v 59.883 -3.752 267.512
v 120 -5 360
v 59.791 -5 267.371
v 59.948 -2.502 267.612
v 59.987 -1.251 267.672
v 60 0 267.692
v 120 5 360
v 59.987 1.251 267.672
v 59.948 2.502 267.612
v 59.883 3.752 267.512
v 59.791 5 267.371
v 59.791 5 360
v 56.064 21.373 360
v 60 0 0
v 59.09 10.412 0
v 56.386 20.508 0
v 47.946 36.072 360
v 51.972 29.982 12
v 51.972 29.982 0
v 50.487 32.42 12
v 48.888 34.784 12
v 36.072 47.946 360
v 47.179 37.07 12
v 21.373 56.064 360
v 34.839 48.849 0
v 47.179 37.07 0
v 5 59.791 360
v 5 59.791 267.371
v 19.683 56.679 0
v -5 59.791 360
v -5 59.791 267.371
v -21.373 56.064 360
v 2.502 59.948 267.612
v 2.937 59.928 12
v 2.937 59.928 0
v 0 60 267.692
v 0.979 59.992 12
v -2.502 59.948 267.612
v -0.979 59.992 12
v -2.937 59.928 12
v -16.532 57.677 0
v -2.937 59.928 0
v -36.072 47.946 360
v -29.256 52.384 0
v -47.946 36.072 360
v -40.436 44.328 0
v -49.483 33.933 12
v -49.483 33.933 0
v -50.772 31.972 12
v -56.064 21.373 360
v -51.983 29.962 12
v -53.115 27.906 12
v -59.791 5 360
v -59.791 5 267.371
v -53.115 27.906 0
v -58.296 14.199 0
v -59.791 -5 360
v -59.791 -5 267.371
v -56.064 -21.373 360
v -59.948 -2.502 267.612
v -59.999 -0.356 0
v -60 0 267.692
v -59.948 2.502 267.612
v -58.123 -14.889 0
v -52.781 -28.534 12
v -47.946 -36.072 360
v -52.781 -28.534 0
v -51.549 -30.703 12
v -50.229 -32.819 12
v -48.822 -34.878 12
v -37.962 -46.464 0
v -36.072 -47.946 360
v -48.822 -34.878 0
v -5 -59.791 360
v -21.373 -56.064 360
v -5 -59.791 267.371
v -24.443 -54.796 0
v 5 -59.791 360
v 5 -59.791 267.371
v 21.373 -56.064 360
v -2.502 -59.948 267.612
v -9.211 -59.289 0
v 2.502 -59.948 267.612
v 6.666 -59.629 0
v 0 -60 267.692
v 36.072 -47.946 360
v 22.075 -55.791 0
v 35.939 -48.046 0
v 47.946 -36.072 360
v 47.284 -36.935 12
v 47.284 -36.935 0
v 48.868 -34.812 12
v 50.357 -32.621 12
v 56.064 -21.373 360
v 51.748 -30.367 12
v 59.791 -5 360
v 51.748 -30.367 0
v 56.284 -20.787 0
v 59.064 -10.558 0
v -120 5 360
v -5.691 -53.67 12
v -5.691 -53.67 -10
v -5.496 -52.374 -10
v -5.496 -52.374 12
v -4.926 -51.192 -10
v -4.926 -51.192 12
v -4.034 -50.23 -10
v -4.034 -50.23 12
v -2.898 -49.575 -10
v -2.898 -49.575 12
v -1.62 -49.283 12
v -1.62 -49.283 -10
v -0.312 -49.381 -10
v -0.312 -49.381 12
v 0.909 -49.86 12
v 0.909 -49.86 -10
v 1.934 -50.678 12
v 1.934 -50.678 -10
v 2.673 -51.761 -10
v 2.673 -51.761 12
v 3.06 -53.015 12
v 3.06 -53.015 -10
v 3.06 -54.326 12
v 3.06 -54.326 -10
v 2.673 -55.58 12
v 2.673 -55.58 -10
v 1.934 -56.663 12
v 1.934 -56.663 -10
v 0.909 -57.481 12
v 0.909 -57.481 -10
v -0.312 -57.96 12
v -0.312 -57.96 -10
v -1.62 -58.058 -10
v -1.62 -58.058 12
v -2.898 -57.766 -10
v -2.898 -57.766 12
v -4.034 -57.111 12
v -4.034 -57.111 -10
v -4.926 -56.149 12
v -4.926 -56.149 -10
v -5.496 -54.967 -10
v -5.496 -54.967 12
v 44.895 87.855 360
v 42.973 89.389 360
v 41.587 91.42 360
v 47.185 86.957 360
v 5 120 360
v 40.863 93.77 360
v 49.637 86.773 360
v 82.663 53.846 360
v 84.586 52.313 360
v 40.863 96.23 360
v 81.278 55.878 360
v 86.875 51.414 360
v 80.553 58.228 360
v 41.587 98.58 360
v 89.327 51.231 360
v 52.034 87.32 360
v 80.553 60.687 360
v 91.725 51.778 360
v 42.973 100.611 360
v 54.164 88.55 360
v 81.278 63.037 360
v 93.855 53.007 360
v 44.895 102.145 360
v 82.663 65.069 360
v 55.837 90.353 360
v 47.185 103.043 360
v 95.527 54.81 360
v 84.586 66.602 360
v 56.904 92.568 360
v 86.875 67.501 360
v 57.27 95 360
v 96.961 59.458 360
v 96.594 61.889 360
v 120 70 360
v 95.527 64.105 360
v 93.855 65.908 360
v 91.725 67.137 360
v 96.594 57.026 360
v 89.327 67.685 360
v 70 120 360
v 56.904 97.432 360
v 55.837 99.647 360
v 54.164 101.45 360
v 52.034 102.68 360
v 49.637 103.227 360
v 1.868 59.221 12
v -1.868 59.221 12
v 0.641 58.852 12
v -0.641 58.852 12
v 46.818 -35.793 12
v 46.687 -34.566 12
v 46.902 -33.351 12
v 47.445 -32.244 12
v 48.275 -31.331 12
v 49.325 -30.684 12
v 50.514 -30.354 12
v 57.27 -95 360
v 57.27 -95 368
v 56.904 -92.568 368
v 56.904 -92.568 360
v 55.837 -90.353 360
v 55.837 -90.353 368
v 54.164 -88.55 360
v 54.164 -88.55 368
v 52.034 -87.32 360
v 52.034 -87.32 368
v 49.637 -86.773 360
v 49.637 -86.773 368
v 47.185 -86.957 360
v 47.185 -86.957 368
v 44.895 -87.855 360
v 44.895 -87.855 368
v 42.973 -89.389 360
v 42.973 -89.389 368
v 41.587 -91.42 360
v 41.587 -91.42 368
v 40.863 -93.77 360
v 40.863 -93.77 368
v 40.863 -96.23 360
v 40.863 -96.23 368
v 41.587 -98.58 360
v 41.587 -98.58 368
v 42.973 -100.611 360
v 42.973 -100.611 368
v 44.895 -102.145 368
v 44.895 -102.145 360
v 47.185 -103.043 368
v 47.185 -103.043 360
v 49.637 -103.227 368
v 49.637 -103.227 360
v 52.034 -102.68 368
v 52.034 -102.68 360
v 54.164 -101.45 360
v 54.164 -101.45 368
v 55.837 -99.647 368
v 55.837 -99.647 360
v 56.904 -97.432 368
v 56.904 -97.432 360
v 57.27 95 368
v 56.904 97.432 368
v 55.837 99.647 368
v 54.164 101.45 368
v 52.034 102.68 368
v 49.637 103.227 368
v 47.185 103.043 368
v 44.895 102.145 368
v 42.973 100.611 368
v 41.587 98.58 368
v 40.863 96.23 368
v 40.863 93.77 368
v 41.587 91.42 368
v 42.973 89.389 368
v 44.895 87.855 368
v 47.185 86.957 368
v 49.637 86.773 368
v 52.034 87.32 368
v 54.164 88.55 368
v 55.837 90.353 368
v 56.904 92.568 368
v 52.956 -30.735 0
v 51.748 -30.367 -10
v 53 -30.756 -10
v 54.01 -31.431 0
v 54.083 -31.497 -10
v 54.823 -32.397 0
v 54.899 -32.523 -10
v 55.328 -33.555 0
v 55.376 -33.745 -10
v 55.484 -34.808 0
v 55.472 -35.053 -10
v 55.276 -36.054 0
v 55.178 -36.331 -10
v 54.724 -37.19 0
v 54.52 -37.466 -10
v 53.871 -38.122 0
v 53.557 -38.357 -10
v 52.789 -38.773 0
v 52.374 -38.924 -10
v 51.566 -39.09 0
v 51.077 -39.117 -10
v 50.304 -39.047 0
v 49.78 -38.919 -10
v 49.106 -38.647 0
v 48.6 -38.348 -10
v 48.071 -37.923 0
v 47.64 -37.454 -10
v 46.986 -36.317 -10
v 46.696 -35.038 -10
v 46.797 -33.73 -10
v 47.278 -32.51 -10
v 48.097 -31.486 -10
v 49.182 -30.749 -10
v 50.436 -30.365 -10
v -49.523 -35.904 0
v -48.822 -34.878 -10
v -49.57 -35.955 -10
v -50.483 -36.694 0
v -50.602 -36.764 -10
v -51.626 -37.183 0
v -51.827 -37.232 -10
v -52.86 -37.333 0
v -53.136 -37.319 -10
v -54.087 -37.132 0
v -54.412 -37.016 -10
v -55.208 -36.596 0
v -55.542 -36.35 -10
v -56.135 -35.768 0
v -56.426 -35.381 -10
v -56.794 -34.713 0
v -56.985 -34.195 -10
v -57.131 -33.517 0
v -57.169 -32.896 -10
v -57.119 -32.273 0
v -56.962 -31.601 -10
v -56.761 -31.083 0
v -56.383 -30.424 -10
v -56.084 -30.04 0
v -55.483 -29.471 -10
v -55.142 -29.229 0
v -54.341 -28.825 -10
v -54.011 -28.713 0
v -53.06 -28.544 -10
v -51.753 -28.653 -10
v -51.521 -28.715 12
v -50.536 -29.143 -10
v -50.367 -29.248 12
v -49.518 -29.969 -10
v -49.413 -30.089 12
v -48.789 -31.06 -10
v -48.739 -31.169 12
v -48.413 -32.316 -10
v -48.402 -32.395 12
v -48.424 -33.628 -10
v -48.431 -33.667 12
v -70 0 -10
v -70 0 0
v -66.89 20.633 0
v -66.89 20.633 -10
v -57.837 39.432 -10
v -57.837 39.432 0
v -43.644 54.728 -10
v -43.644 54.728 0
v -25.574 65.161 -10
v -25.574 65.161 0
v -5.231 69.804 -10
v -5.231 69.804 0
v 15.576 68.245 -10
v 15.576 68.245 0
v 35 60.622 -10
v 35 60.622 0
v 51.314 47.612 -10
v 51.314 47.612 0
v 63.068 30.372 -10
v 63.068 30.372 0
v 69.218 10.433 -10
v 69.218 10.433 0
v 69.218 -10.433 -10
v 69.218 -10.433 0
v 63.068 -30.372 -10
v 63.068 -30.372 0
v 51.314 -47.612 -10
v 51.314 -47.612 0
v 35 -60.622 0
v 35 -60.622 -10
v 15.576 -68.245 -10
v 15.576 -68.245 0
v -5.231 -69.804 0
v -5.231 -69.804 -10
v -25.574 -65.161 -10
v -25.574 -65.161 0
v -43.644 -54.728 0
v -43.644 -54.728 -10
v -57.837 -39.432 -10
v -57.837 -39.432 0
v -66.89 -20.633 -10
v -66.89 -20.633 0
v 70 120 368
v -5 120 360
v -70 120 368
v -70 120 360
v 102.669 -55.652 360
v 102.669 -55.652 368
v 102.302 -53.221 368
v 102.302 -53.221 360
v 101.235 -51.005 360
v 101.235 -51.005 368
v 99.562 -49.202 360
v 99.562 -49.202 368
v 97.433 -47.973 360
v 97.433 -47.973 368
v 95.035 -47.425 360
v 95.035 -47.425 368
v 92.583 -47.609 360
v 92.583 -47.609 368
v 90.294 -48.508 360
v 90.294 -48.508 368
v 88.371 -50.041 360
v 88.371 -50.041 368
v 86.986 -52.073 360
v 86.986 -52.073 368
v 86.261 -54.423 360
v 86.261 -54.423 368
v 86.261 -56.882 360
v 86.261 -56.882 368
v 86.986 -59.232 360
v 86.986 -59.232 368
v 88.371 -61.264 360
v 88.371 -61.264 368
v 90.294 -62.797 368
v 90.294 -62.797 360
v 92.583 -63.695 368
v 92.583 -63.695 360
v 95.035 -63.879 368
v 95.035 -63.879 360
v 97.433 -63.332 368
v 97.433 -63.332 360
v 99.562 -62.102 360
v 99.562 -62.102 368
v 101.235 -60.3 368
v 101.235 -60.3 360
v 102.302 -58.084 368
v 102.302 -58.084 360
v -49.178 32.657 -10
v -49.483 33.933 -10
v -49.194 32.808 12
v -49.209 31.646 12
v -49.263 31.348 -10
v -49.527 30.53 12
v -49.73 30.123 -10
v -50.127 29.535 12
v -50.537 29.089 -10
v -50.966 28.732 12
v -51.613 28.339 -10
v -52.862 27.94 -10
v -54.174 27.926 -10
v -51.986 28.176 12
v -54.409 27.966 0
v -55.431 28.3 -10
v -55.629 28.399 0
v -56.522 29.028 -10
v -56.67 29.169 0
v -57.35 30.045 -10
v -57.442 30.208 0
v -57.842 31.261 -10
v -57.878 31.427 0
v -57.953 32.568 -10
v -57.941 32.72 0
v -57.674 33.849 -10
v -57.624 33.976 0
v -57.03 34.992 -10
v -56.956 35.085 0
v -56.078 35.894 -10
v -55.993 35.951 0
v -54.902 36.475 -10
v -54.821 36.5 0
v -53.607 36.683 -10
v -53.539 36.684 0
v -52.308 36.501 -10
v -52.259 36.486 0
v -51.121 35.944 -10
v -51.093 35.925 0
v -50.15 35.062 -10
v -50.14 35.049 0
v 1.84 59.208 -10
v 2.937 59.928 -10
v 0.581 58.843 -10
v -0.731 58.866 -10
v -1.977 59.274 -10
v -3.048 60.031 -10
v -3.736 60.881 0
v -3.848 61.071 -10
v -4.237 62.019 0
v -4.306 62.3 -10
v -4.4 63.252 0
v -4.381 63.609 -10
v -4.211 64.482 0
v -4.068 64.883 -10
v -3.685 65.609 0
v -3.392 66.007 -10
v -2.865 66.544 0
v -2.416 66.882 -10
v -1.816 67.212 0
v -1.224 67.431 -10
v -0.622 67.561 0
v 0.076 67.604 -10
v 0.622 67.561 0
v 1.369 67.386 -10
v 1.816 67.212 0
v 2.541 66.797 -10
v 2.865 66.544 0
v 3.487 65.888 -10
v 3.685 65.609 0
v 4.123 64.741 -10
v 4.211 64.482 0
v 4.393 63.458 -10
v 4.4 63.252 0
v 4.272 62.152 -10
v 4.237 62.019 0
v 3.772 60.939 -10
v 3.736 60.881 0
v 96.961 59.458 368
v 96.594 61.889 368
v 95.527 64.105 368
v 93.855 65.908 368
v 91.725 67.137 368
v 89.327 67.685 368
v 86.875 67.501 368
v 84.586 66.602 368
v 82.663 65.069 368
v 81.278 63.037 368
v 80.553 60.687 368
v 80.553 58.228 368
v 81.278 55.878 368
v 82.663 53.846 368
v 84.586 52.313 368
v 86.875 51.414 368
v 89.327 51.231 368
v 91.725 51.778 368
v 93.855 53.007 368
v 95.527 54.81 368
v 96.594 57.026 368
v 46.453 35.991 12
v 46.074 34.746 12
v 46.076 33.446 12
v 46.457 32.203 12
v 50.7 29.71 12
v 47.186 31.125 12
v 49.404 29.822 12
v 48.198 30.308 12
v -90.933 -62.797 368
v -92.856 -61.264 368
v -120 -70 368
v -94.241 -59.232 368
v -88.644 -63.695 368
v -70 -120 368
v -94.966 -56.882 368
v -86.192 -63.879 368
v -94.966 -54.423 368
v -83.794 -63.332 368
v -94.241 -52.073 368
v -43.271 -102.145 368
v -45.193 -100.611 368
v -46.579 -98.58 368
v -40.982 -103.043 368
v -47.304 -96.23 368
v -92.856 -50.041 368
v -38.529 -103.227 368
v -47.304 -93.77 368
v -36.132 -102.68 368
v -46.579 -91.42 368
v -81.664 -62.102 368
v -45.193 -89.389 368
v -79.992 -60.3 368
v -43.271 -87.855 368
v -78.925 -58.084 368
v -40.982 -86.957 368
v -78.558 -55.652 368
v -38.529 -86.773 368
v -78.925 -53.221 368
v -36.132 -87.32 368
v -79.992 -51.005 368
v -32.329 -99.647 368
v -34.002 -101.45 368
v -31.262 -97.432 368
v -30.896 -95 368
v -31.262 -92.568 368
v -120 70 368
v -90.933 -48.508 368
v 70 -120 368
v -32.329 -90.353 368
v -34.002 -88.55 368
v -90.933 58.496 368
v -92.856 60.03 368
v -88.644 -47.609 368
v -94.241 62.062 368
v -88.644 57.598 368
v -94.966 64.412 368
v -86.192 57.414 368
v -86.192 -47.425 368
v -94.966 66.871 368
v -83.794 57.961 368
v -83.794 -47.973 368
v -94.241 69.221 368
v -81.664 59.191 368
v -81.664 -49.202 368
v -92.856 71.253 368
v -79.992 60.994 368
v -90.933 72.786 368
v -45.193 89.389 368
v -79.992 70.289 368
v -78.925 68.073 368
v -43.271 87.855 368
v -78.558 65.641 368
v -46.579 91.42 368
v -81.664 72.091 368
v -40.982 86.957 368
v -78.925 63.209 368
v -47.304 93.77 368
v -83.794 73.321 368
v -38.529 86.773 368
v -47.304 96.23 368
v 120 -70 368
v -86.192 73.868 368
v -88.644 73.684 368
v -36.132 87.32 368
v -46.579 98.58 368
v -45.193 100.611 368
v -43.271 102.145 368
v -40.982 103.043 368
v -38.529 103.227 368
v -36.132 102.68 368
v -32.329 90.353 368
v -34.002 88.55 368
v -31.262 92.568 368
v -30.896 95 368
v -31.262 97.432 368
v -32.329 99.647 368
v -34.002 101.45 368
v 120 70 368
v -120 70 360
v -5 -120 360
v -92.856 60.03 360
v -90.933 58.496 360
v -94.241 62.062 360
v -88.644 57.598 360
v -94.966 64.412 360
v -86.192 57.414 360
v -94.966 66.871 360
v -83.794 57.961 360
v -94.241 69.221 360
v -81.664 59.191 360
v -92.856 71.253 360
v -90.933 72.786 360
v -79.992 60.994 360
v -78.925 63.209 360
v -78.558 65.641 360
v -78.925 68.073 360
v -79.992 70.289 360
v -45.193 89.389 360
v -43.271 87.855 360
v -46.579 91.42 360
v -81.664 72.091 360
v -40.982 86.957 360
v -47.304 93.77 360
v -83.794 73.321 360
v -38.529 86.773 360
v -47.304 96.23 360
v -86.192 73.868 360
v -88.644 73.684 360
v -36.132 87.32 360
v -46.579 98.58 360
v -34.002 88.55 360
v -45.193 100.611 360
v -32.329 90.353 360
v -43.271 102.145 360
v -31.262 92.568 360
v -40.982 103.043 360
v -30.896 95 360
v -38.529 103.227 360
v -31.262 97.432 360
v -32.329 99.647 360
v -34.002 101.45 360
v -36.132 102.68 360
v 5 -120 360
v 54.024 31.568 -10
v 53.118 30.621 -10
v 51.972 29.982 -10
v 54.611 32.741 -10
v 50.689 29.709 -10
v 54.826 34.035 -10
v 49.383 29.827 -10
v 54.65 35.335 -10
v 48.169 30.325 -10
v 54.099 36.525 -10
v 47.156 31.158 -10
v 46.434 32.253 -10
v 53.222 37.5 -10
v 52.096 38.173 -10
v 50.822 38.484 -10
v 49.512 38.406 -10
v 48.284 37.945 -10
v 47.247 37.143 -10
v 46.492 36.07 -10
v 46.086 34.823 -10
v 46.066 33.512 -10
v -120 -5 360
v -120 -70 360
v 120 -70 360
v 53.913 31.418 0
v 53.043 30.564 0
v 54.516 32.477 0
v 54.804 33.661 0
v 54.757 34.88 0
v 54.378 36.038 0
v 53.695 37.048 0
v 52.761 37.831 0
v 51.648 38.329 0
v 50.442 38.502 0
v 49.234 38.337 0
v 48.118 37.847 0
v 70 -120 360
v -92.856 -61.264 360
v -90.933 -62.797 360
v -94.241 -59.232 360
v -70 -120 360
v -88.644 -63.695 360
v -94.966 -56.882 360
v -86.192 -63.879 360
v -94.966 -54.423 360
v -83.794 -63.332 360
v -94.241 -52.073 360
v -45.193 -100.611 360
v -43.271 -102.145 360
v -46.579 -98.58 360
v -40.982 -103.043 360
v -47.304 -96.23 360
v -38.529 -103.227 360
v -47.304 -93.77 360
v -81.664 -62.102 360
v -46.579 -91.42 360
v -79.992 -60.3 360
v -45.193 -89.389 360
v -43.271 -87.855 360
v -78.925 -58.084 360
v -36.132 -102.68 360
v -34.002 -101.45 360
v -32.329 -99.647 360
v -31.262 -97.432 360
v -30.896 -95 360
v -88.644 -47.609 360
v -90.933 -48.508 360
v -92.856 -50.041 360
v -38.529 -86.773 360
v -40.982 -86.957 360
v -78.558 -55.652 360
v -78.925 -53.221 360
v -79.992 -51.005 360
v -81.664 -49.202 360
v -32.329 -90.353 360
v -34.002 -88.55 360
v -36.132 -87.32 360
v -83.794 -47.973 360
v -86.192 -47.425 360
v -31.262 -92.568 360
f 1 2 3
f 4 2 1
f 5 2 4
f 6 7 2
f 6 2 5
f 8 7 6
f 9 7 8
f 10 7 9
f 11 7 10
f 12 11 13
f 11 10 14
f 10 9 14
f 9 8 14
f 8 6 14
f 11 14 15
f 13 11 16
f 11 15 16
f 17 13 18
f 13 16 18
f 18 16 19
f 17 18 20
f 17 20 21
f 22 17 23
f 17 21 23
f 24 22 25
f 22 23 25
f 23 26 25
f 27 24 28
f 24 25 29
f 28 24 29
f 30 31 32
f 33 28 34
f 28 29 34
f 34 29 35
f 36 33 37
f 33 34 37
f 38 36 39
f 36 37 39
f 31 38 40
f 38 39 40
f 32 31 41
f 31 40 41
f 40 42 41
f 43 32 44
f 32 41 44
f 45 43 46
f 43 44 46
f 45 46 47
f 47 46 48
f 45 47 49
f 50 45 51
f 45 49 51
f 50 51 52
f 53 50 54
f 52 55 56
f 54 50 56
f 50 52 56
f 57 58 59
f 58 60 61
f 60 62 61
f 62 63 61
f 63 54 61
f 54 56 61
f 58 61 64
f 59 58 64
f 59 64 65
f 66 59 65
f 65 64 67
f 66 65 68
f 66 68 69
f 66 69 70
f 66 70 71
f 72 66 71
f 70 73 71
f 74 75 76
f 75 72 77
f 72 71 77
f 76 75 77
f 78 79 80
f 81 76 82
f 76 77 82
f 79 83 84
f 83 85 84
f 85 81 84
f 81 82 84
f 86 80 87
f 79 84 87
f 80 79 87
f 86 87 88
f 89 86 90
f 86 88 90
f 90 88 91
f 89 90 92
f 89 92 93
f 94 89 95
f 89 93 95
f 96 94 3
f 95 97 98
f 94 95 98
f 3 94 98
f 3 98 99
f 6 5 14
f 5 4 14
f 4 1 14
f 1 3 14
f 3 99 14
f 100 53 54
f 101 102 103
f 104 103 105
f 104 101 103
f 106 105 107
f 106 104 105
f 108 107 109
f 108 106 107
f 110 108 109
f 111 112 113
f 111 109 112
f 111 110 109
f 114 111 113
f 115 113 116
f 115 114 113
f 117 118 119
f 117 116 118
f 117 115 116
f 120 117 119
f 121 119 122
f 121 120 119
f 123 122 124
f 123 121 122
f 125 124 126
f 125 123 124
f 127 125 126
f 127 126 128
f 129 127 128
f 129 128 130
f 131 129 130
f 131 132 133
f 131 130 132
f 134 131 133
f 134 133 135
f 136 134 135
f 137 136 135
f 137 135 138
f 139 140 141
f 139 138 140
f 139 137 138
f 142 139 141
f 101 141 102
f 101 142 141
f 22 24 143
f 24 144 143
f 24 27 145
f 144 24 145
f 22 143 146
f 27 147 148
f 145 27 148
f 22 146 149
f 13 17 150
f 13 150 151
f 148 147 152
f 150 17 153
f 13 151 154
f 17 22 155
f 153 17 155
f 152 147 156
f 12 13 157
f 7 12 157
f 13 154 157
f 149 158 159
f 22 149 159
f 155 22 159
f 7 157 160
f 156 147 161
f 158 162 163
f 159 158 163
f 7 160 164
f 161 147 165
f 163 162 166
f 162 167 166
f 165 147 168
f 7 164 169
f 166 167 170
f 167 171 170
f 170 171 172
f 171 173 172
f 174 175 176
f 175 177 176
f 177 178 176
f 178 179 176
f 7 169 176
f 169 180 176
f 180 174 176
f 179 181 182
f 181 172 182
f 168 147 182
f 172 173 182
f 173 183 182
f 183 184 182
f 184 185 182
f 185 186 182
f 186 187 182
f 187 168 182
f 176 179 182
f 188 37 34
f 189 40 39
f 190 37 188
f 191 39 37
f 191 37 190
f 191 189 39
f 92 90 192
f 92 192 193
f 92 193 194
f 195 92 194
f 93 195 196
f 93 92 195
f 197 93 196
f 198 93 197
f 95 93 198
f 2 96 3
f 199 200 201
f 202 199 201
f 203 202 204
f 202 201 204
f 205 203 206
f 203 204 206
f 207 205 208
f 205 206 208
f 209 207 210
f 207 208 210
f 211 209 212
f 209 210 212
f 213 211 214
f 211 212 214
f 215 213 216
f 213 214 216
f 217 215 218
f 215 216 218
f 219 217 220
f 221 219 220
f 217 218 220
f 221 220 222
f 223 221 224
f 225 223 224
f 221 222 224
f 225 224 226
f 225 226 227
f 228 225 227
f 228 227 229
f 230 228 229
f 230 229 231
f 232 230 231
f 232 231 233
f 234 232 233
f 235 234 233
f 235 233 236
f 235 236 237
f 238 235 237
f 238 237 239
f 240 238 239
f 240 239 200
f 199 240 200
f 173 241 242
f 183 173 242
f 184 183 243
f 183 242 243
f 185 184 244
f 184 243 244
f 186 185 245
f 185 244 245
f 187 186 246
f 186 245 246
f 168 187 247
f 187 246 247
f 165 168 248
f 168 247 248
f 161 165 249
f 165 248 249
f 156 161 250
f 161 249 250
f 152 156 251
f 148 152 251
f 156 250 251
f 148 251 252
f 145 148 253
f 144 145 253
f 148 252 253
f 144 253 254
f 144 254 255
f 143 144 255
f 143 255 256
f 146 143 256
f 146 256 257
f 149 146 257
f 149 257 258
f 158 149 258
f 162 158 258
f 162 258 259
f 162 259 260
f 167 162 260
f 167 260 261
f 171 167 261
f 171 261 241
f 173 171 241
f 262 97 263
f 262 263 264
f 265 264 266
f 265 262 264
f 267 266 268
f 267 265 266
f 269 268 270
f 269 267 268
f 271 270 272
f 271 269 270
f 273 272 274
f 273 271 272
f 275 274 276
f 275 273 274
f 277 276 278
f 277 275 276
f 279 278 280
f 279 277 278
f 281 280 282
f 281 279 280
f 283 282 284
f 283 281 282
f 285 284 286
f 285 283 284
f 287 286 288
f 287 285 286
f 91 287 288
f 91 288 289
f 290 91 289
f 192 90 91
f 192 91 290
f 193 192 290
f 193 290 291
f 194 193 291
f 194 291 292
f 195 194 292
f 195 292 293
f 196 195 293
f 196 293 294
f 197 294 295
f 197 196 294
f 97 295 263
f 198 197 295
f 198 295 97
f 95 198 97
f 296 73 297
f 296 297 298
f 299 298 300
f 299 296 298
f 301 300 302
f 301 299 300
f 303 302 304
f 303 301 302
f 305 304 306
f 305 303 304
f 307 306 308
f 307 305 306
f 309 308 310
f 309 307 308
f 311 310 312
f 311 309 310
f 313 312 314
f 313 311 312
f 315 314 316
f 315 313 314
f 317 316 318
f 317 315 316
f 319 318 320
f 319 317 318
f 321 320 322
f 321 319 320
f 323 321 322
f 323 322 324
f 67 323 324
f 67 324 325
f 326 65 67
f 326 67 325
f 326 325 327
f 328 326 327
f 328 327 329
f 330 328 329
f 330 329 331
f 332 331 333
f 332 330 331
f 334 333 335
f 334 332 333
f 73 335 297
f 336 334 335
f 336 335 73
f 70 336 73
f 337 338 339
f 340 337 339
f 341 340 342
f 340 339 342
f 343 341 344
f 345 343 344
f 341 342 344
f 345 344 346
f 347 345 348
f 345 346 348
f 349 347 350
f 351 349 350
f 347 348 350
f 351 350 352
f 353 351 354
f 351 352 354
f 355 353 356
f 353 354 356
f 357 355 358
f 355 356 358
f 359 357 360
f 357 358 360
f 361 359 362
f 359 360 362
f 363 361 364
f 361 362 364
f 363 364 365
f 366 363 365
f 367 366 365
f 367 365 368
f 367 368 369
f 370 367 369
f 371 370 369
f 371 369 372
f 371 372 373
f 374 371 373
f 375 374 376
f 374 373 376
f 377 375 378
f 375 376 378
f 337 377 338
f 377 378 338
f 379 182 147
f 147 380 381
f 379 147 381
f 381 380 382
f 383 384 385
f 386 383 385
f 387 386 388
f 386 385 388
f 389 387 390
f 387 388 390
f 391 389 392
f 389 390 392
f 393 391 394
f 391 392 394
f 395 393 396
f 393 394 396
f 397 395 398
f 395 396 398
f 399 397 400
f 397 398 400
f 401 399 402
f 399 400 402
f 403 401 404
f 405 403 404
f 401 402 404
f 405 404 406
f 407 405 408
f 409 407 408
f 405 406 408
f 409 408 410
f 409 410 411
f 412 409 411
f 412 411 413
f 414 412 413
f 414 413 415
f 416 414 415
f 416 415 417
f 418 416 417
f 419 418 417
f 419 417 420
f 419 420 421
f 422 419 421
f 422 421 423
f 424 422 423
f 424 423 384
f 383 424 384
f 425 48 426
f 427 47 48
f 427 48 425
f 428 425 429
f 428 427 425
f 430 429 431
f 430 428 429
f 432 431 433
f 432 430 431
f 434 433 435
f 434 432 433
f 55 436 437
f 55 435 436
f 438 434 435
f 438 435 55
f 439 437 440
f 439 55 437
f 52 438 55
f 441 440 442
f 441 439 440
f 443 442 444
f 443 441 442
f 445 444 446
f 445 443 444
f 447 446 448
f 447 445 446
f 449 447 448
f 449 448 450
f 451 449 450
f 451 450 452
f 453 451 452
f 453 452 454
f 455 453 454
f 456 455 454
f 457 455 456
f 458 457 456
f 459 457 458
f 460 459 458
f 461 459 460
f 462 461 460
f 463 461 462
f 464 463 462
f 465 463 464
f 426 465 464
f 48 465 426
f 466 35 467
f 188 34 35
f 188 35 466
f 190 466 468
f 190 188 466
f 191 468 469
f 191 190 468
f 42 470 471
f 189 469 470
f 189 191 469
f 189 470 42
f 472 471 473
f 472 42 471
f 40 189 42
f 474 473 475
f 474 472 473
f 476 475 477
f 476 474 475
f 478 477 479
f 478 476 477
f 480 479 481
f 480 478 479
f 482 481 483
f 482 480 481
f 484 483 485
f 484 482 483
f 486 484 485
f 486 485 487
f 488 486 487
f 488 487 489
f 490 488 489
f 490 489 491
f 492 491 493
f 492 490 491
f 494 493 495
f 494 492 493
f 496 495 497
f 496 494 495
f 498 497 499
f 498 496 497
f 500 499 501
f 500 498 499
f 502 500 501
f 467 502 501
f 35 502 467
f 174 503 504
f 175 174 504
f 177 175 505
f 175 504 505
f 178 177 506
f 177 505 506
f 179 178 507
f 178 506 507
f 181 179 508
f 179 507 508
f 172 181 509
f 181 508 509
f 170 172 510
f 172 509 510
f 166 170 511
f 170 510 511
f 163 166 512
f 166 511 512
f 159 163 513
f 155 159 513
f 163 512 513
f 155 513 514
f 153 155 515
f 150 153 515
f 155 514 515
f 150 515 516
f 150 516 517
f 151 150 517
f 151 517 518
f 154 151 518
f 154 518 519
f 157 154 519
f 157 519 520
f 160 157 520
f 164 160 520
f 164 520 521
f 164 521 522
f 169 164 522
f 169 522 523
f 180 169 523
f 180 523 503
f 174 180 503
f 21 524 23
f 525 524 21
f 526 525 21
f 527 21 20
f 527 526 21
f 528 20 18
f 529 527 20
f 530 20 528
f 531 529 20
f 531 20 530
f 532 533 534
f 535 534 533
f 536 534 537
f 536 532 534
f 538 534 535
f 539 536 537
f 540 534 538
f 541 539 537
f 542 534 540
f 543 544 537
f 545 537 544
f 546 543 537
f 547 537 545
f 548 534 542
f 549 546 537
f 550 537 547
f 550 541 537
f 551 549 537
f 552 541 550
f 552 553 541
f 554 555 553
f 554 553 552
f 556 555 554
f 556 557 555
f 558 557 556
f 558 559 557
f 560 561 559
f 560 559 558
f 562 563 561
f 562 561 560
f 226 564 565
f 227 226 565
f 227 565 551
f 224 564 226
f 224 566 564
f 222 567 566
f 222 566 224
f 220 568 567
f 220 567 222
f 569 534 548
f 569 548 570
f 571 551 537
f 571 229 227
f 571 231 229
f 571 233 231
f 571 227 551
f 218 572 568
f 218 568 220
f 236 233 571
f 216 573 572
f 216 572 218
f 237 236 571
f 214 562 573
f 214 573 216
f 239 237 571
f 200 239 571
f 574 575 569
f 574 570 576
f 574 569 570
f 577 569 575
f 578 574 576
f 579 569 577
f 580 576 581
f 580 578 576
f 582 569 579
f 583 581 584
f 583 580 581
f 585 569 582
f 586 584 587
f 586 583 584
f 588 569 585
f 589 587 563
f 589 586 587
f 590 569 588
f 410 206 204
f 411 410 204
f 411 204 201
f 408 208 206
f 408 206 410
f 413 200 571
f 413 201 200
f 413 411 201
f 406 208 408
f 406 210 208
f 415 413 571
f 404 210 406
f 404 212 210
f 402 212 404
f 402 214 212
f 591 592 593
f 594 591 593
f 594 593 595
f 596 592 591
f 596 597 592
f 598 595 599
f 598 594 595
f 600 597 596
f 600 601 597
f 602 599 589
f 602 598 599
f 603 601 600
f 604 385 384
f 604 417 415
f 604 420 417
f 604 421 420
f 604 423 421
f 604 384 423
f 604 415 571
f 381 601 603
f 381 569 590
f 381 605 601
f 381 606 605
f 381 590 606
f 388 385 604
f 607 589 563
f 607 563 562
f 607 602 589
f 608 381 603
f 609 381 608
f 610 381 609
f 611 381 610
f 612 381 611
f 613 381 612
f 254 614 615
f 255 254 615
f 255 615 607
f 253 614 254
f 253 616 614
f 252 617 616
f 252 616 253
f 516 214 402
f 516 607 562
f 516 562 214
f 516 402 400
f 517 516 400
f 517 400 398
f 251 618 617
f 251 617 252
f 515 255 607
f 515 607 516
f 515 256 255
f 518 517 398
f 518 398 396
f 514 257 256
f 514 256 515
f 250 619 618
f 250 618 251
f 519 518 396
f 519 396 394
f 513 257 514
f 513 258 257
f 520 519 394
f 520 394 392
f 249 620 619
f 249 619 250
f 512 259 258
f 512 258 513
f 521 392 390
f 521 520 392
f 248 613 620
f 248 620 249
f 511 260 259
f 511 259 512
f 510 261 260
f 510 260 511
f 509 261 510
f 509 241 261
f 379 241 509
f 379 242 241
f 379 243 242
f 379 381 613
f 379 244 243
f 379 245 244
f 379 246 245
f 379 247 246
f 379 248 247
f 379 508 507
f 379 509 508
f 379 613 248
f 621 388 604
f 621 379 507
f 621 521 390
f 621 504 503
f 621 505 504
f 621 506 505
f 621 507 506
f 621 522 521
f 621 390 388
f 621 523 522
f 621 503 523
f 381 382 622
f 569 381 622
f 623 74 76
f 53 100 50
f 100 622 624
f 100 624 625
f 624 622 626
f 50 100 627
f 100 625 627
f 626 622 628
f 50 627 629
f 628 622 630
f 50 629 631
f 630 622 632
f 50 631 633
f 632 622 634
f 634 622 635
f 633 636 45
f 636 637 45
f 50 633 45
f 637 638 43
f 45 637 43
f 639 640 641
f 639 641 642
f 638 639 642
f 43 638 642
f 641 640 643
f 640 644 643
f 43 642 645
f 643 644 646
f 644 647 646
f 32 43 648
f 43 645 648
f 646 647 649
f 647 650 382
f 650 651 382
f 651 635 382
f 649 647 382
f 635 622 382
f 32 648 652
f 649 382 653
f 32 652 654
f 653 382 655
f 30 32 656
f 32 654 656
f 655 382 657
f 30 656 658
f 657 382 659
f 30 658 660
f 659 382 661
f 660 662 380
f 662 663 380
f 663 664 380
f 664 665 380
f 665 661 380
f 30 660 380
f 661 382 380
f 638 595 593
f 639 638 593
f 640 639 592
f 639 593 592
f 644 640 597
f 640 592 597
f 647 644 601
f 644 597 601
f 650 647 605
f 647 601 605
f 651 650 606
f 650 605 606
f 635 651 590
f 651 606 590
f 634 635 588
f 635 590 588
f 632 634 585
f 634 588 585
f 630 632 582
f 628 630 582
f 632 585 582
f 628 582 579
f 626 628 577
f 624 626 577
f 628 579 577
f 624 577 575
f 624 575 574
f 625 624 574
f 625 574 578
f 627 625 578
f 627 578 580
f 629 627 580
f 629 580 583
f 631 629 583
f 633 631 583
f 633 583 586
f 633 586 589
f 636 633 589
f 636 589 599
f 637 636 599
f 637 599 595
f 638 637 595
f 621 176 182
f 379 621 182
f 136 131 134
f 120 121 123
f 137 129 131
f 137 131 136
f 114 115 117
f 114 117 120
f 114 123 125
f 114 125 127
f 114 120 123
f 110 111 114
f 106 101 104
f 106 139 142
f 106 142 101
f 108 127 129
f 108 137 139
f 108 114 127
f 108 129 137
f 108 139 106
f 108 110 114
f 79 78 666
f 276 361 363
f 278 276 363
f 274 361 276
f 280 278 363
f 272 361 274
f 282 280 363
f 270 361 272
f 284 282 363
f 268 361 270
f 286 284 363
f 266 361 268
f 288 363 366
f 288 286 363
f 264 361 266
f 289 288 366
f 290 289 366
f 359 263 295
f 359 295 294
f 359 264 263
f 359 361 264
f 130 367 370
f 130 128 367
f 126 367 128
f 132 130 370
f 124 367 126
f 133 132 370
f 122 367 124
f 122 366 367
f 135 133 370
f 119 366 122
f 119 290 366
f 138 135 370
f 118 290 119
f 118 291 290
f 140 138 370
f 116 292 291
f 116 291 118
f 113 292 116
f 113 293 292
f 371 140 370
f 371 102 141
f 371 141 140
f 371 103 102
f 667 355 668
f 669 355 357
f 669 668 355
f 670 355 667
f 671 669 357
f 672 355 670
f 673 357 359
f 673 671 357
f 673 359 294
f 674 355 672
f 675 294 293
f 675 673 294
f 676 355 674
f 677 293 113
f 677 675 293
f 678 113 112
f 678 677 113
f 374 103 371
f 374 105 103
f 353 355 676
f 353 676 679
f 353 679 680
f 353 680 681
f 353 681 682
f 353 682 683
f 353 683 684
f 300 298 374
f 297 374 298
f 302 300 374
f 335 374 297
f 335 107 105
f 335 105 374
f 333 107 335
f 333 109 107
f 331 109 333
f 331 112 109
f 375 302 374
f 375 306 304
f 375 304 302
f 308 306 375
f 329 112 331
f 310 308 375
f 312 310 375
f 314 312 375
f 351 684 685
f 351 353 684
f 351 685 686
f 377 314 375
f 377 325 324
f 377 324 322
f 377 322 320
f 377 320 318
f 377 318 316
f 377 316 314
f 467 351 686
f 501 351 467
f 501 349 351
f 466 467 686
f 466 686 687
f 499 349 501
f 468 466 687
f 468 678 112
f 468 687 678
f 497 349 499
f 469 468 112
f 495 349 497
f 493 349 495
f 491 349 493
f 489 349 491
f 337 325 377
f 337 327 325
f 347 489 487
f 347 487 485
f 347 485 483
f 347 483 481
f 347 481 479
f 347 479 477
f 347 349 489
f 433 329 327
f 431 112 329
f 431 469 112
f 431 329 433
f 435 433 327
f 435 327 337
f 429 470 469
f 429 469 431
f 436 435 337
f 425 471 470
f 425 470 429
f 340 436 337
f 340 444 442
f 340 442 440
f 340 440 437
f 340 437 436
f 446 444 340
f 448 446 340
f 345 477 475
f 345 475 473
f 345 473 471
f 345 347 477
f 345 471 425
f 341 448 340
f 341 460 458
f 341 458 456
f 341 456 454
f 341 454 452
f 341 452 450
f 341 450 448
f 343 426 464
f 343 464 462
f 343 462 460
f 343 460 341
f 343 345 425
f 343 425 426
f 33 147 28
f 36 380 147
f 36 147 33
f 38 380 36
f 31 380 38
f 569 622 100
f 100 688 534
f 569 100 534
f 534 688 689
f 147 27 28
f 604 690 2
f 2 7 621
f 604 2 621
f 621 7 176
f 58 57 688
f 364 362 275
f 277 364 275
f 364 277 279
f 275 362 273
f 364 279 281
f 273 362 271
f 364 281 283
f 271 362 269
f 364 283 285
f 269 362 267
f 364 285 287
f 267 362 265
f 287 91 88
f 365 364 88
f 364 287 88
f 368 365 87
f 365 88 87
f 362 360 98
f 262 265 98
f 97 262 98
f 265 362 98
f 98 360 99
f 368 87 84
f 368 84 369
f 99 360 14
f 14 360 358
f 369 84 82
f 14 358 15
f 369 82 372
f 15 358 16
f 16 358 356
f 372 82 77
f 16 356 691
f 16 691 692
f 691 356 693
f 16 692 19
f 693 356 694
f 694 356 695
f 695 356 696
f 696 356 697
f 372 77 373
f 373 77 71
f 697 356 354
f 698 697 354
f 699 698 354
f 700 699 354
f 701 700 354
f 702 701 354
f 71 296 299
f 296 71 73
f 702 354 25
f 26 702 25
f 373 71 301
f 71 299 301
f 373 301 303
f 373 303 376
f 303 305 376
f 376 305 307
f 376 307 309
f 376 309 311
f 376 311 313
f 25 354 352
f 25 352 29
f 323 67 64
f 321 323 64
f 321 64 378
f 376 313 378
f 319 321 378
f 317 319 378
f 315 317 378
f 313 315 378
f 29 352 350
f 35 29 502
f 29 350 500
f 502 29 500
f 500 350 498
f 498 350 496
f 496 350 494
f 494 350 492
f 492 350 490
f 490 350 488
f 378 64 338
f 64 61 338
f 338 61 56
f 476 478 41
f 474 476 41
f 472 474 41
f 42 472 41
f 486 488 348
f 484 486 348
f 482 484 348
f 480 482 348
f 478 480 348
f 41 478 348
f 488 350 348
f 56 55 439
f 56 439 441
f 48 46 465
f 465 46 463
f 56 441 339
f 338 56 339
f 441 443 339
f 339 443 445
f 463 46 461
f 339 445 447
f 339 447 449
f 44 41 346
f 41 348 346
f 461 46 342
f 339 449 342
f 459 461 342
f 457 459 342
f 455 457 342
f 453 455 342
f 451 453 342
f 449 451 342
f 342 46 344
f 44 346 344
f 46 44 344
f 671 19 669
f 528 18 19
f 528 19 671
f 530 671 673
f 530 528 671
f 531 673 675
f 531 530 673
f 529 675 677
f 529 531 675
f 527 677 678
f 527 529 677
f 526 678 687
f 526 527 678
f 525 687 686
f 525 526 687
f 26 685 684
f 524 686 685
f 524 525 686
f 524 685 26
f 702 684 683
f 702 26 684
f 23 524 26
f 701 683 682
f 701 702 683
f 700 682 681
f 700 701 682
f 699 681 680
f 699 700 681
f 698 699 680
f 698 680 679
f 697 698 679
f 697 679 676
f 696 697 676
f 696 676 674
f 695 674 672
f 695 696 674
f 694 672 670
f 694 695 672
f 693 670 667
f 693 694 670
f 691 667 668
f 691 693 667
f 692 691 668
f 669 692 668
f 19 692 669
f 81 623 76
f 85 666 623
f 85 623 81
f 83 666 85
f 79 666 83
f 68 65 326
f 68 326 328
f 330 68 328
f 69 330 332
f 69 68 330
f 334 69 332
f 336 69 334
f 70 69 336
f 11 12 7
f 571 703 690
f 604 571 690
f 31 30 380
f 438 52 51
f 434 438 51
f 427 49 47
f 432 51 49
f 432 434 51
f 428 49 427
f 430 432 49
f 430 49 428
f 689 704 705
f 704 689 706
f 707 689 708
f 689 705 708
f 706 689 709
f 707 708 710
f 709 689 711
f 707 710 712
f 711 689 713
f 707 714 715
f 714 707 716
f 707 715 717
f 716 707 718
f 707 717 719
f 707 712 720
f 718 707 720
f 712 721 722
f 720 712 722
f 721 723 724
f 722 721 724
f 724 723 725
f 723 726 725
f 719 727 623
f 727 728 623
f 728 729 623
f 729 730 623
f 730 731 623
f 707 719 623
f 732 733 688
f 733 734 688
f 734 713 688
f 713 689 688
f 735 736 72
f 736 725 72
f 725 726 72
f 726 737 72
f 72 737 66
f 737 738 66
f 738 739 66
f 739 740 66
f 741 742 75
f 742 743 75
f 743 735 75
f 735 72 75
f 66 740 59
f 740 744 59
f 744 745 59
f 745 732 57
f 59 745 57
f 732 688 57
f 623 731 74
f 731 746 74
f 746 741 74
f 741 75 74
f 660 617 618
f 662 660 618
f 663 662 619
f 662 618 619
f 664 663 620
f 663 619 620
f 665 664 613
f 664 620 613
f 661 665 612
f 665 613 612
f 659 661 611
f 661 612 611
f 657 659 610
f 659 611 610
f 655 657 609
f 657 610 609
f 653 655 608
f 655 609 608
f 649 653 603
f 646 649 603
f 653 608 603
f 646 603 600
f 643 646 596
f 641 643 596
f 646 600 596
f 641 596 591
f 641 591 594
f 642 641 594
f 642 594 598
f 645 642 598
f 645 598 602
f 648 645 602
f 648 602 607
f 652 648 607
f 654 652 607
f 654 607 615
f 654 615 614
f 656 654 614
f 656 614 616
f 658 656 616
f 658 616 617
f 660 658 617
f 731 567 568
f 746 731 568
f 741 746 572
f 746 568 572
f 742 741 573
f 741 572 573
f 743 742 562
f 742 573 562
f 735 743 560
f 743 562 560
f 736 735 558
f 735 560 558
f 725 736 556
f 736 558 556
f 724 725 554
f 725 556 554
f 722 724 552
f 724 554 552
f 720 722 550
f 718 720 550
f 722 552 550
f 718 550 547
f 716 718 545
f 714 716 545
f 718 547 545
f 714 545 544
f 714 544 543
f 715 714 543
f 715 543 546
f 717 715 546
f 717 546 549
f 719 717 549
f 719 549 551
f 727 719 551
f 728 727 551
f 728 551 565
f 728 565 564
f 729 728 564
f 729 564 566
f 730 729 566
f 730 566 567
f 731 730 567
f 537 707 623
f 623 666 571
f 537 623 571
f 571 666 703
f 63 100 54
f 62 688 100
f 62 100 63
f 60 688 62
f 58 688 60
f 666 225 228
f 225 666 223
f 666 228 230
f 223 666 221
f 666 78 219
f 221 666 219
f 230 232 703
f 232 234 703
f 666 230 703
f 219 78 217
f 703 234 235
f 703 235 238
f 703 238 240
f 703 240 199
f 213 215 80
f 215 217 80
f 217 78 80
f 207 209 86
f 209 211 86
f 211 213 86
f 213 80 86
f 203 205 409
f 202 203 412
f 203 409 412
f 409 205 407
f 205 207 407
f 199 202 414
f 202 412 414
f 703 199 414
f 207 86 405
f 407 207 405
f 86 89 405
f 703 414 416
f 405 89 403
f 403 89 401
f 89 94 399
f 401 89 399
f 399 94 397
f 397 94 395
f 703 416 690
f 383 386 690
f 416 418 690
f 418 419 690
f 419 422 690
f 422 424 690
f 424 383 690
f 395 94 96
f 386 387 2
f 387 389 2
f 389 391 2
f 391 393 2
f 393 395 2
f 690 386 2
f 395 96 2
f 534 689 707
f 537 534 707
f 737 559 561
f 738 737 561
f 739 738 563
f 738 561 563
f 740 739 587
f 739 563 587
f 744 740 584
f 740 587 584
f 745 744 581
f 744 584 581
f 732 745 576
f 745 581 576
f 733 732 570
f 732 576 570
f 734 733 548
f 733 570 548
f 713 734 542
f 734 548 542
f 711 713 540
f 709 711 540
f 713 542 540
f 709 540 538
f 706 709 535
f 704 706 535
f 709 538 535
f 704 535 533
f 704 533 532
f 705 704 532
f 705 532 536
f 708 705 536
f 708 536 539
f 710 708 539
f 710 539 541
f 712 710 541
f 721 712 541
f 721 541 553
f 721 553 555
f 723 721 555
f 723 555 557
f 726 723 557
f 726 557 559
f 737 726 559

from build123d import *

# Parameters (mm, degrees)
SKETCH2_R               = 60
BOSS_EXTRUDE1_DEPTH     = 360
SKETCH3_R               = 70
BOSS_EXTRUDE2_DEPTH     = 10
BOSS_EXTRUDE4_DEPTH     = 8
BOSS_EXTRUDE5_DEPTH     = 5
CIRPATTERN1_COUNT       = 4
SKETCH5_R               = 8.25
CUT_EXTRUDE2_DEPTH      = 10
SKETCH8_R               = 8.25
CUT_EXTRUDE3_DEPTH      = 10
CUT_EXTRUDE8_DEPTH      = 25
CUT_EXTRUDE8_DEPTH_BACK = 22
SKETCH9_R               = 4.4


with BuildPart() as part:
    # Sketch2 → Boss-Extrude1 (new body)
    with BuildSketch(Plane.XY):
        Circle(SKETCH2_R)
    extrude(amount=BOSS_EXTRUDE1_DEPTH)

    # Sketch3 → Boss-Extrude2 (add)
    with BuildSketch(Plane(origin=(0, 0, 0), x_dir=(-1, 0, 0), z_dir=(0, 0, -1))):
        Circle(SKETCH3_R)
    extrude(amount=BOSS_EXTRUDE2_DEPTH)

    # Sketch4 → Boss-Extrude4 (add)
    with BuildSketch(Plane.XY.offset(360)):
        Polygon((-70, 120), (-120, 70), (-120, -70), (-70, -120), (70, -120), (120, -70), (120, 70), (70, 120), align=None)
    extrude(amount=BOSS_EXTRUDE4_DEPTH)

    # Sketch7 → Boss-Extrude5 (add, symmetric)
    with BuildSketch(Plane(origin=(0, 0, 0), x_dir=(0, 0, -1), z_dir=(1, 0, 0))):
        Polygon((-360, -120), (-260, -55), (-360, -55), align=None)
    boss_extrude5 = extrude(amount=BOSS_EXTRUDE5_DEPTH, both=True)

    # CirPattern1: Boss-Extrude5 ×4 about axis
    cirpattern1_axis = Axis((0, 0, 0), (0, 0, 1))
    for i in range(1, CIRPATTERN1_COUNT):
        add(boss_extrude5.rotate(cirpattern1_axis, i * 360 / CIRPATTERN1_COUNT))

    # Sketch5 → Cut-Extrude2 (cut)
    with BuildSketch(Plane.XY.offset(368)):
        with Locations((-39.145715053, 95)):
            Circle(SKETCH5_R)
        with Locations((-39.145715053, -95)):
            Circle(SKETCH5_R)
        with Locations((49.020413154, 95)):
            Circle(SKETCH5_R)
        with Locations((49.020413154, -95)):
            Circle(SKETCH5_R)
    extrude(amount=-CUT_EXTRUDE2_DEPTH, mode=Mode.SUBTRACT)

    # Sketch8 → Cut-Extrude3 (cut)
    with BuildSketch(Plane.XY.offset(368)):
        with Locations((-86.808078285, 65.641177005)):
            Circle(SKETCH8_R)
        with Locations((-86.808078285, -55.652302243)):
            Circle(SKETCH8_R)
        with Locations((94.418649532, -55.652302243)):
            Circle(SKETCH8_R)
        with Locations((88.710721097, 59.457587867)):
            Circle(SKETCH8_R)
    extrude(amount=-CUT_EXTRUDE3_DEPTH, mode=Mode.SUBTRACT)

    # Sketch9 → Cut-Extrude8 (cut, two sides: drawn at the far end of the back side and taken through both)
    with BuildSketch(Plane(origin=(0, 0, -10), x_dir=(-1, 0, 0), z_dir=(0, 0, -1)).offset(-CUT_EXTRUDE8_DEPTH_BACK)):
        with Locations(Location((0, 63.204671138, 0), (0, 0, 228.131406789))):
            Circle(SKETCH9_R)
        with Locations((1.290982991, -53.670475155)):
            Circle(SKETCH9_R)
        with Locations(Location((53.562270393, 32.283588378, 0), (0, 0, 157.987594356))):
            Circle(SKETCH9_R)
        with Locations(Location((-50.426550115, 34.101651925, 0), (0, 0, 249.437866914))):
            Circle(SKETCH9_R)
        with Locations(Location((52.769279557, -32.934214303, 0), (0, 0, 206.210166052))):
            Circle(SKETCH9_R)
        with Locations(Location((-51.084491131, -34.716860238, 0), (0, 0, 98.670706964))):
            Circle(SKETCH9_R)
    extrude(amount=CUT_EXTRUDE8_DEPTH + CUT_EXTRUDE8_DEPTH_BACK, mode=Mode.SUBTRACT)


solid = part.part
